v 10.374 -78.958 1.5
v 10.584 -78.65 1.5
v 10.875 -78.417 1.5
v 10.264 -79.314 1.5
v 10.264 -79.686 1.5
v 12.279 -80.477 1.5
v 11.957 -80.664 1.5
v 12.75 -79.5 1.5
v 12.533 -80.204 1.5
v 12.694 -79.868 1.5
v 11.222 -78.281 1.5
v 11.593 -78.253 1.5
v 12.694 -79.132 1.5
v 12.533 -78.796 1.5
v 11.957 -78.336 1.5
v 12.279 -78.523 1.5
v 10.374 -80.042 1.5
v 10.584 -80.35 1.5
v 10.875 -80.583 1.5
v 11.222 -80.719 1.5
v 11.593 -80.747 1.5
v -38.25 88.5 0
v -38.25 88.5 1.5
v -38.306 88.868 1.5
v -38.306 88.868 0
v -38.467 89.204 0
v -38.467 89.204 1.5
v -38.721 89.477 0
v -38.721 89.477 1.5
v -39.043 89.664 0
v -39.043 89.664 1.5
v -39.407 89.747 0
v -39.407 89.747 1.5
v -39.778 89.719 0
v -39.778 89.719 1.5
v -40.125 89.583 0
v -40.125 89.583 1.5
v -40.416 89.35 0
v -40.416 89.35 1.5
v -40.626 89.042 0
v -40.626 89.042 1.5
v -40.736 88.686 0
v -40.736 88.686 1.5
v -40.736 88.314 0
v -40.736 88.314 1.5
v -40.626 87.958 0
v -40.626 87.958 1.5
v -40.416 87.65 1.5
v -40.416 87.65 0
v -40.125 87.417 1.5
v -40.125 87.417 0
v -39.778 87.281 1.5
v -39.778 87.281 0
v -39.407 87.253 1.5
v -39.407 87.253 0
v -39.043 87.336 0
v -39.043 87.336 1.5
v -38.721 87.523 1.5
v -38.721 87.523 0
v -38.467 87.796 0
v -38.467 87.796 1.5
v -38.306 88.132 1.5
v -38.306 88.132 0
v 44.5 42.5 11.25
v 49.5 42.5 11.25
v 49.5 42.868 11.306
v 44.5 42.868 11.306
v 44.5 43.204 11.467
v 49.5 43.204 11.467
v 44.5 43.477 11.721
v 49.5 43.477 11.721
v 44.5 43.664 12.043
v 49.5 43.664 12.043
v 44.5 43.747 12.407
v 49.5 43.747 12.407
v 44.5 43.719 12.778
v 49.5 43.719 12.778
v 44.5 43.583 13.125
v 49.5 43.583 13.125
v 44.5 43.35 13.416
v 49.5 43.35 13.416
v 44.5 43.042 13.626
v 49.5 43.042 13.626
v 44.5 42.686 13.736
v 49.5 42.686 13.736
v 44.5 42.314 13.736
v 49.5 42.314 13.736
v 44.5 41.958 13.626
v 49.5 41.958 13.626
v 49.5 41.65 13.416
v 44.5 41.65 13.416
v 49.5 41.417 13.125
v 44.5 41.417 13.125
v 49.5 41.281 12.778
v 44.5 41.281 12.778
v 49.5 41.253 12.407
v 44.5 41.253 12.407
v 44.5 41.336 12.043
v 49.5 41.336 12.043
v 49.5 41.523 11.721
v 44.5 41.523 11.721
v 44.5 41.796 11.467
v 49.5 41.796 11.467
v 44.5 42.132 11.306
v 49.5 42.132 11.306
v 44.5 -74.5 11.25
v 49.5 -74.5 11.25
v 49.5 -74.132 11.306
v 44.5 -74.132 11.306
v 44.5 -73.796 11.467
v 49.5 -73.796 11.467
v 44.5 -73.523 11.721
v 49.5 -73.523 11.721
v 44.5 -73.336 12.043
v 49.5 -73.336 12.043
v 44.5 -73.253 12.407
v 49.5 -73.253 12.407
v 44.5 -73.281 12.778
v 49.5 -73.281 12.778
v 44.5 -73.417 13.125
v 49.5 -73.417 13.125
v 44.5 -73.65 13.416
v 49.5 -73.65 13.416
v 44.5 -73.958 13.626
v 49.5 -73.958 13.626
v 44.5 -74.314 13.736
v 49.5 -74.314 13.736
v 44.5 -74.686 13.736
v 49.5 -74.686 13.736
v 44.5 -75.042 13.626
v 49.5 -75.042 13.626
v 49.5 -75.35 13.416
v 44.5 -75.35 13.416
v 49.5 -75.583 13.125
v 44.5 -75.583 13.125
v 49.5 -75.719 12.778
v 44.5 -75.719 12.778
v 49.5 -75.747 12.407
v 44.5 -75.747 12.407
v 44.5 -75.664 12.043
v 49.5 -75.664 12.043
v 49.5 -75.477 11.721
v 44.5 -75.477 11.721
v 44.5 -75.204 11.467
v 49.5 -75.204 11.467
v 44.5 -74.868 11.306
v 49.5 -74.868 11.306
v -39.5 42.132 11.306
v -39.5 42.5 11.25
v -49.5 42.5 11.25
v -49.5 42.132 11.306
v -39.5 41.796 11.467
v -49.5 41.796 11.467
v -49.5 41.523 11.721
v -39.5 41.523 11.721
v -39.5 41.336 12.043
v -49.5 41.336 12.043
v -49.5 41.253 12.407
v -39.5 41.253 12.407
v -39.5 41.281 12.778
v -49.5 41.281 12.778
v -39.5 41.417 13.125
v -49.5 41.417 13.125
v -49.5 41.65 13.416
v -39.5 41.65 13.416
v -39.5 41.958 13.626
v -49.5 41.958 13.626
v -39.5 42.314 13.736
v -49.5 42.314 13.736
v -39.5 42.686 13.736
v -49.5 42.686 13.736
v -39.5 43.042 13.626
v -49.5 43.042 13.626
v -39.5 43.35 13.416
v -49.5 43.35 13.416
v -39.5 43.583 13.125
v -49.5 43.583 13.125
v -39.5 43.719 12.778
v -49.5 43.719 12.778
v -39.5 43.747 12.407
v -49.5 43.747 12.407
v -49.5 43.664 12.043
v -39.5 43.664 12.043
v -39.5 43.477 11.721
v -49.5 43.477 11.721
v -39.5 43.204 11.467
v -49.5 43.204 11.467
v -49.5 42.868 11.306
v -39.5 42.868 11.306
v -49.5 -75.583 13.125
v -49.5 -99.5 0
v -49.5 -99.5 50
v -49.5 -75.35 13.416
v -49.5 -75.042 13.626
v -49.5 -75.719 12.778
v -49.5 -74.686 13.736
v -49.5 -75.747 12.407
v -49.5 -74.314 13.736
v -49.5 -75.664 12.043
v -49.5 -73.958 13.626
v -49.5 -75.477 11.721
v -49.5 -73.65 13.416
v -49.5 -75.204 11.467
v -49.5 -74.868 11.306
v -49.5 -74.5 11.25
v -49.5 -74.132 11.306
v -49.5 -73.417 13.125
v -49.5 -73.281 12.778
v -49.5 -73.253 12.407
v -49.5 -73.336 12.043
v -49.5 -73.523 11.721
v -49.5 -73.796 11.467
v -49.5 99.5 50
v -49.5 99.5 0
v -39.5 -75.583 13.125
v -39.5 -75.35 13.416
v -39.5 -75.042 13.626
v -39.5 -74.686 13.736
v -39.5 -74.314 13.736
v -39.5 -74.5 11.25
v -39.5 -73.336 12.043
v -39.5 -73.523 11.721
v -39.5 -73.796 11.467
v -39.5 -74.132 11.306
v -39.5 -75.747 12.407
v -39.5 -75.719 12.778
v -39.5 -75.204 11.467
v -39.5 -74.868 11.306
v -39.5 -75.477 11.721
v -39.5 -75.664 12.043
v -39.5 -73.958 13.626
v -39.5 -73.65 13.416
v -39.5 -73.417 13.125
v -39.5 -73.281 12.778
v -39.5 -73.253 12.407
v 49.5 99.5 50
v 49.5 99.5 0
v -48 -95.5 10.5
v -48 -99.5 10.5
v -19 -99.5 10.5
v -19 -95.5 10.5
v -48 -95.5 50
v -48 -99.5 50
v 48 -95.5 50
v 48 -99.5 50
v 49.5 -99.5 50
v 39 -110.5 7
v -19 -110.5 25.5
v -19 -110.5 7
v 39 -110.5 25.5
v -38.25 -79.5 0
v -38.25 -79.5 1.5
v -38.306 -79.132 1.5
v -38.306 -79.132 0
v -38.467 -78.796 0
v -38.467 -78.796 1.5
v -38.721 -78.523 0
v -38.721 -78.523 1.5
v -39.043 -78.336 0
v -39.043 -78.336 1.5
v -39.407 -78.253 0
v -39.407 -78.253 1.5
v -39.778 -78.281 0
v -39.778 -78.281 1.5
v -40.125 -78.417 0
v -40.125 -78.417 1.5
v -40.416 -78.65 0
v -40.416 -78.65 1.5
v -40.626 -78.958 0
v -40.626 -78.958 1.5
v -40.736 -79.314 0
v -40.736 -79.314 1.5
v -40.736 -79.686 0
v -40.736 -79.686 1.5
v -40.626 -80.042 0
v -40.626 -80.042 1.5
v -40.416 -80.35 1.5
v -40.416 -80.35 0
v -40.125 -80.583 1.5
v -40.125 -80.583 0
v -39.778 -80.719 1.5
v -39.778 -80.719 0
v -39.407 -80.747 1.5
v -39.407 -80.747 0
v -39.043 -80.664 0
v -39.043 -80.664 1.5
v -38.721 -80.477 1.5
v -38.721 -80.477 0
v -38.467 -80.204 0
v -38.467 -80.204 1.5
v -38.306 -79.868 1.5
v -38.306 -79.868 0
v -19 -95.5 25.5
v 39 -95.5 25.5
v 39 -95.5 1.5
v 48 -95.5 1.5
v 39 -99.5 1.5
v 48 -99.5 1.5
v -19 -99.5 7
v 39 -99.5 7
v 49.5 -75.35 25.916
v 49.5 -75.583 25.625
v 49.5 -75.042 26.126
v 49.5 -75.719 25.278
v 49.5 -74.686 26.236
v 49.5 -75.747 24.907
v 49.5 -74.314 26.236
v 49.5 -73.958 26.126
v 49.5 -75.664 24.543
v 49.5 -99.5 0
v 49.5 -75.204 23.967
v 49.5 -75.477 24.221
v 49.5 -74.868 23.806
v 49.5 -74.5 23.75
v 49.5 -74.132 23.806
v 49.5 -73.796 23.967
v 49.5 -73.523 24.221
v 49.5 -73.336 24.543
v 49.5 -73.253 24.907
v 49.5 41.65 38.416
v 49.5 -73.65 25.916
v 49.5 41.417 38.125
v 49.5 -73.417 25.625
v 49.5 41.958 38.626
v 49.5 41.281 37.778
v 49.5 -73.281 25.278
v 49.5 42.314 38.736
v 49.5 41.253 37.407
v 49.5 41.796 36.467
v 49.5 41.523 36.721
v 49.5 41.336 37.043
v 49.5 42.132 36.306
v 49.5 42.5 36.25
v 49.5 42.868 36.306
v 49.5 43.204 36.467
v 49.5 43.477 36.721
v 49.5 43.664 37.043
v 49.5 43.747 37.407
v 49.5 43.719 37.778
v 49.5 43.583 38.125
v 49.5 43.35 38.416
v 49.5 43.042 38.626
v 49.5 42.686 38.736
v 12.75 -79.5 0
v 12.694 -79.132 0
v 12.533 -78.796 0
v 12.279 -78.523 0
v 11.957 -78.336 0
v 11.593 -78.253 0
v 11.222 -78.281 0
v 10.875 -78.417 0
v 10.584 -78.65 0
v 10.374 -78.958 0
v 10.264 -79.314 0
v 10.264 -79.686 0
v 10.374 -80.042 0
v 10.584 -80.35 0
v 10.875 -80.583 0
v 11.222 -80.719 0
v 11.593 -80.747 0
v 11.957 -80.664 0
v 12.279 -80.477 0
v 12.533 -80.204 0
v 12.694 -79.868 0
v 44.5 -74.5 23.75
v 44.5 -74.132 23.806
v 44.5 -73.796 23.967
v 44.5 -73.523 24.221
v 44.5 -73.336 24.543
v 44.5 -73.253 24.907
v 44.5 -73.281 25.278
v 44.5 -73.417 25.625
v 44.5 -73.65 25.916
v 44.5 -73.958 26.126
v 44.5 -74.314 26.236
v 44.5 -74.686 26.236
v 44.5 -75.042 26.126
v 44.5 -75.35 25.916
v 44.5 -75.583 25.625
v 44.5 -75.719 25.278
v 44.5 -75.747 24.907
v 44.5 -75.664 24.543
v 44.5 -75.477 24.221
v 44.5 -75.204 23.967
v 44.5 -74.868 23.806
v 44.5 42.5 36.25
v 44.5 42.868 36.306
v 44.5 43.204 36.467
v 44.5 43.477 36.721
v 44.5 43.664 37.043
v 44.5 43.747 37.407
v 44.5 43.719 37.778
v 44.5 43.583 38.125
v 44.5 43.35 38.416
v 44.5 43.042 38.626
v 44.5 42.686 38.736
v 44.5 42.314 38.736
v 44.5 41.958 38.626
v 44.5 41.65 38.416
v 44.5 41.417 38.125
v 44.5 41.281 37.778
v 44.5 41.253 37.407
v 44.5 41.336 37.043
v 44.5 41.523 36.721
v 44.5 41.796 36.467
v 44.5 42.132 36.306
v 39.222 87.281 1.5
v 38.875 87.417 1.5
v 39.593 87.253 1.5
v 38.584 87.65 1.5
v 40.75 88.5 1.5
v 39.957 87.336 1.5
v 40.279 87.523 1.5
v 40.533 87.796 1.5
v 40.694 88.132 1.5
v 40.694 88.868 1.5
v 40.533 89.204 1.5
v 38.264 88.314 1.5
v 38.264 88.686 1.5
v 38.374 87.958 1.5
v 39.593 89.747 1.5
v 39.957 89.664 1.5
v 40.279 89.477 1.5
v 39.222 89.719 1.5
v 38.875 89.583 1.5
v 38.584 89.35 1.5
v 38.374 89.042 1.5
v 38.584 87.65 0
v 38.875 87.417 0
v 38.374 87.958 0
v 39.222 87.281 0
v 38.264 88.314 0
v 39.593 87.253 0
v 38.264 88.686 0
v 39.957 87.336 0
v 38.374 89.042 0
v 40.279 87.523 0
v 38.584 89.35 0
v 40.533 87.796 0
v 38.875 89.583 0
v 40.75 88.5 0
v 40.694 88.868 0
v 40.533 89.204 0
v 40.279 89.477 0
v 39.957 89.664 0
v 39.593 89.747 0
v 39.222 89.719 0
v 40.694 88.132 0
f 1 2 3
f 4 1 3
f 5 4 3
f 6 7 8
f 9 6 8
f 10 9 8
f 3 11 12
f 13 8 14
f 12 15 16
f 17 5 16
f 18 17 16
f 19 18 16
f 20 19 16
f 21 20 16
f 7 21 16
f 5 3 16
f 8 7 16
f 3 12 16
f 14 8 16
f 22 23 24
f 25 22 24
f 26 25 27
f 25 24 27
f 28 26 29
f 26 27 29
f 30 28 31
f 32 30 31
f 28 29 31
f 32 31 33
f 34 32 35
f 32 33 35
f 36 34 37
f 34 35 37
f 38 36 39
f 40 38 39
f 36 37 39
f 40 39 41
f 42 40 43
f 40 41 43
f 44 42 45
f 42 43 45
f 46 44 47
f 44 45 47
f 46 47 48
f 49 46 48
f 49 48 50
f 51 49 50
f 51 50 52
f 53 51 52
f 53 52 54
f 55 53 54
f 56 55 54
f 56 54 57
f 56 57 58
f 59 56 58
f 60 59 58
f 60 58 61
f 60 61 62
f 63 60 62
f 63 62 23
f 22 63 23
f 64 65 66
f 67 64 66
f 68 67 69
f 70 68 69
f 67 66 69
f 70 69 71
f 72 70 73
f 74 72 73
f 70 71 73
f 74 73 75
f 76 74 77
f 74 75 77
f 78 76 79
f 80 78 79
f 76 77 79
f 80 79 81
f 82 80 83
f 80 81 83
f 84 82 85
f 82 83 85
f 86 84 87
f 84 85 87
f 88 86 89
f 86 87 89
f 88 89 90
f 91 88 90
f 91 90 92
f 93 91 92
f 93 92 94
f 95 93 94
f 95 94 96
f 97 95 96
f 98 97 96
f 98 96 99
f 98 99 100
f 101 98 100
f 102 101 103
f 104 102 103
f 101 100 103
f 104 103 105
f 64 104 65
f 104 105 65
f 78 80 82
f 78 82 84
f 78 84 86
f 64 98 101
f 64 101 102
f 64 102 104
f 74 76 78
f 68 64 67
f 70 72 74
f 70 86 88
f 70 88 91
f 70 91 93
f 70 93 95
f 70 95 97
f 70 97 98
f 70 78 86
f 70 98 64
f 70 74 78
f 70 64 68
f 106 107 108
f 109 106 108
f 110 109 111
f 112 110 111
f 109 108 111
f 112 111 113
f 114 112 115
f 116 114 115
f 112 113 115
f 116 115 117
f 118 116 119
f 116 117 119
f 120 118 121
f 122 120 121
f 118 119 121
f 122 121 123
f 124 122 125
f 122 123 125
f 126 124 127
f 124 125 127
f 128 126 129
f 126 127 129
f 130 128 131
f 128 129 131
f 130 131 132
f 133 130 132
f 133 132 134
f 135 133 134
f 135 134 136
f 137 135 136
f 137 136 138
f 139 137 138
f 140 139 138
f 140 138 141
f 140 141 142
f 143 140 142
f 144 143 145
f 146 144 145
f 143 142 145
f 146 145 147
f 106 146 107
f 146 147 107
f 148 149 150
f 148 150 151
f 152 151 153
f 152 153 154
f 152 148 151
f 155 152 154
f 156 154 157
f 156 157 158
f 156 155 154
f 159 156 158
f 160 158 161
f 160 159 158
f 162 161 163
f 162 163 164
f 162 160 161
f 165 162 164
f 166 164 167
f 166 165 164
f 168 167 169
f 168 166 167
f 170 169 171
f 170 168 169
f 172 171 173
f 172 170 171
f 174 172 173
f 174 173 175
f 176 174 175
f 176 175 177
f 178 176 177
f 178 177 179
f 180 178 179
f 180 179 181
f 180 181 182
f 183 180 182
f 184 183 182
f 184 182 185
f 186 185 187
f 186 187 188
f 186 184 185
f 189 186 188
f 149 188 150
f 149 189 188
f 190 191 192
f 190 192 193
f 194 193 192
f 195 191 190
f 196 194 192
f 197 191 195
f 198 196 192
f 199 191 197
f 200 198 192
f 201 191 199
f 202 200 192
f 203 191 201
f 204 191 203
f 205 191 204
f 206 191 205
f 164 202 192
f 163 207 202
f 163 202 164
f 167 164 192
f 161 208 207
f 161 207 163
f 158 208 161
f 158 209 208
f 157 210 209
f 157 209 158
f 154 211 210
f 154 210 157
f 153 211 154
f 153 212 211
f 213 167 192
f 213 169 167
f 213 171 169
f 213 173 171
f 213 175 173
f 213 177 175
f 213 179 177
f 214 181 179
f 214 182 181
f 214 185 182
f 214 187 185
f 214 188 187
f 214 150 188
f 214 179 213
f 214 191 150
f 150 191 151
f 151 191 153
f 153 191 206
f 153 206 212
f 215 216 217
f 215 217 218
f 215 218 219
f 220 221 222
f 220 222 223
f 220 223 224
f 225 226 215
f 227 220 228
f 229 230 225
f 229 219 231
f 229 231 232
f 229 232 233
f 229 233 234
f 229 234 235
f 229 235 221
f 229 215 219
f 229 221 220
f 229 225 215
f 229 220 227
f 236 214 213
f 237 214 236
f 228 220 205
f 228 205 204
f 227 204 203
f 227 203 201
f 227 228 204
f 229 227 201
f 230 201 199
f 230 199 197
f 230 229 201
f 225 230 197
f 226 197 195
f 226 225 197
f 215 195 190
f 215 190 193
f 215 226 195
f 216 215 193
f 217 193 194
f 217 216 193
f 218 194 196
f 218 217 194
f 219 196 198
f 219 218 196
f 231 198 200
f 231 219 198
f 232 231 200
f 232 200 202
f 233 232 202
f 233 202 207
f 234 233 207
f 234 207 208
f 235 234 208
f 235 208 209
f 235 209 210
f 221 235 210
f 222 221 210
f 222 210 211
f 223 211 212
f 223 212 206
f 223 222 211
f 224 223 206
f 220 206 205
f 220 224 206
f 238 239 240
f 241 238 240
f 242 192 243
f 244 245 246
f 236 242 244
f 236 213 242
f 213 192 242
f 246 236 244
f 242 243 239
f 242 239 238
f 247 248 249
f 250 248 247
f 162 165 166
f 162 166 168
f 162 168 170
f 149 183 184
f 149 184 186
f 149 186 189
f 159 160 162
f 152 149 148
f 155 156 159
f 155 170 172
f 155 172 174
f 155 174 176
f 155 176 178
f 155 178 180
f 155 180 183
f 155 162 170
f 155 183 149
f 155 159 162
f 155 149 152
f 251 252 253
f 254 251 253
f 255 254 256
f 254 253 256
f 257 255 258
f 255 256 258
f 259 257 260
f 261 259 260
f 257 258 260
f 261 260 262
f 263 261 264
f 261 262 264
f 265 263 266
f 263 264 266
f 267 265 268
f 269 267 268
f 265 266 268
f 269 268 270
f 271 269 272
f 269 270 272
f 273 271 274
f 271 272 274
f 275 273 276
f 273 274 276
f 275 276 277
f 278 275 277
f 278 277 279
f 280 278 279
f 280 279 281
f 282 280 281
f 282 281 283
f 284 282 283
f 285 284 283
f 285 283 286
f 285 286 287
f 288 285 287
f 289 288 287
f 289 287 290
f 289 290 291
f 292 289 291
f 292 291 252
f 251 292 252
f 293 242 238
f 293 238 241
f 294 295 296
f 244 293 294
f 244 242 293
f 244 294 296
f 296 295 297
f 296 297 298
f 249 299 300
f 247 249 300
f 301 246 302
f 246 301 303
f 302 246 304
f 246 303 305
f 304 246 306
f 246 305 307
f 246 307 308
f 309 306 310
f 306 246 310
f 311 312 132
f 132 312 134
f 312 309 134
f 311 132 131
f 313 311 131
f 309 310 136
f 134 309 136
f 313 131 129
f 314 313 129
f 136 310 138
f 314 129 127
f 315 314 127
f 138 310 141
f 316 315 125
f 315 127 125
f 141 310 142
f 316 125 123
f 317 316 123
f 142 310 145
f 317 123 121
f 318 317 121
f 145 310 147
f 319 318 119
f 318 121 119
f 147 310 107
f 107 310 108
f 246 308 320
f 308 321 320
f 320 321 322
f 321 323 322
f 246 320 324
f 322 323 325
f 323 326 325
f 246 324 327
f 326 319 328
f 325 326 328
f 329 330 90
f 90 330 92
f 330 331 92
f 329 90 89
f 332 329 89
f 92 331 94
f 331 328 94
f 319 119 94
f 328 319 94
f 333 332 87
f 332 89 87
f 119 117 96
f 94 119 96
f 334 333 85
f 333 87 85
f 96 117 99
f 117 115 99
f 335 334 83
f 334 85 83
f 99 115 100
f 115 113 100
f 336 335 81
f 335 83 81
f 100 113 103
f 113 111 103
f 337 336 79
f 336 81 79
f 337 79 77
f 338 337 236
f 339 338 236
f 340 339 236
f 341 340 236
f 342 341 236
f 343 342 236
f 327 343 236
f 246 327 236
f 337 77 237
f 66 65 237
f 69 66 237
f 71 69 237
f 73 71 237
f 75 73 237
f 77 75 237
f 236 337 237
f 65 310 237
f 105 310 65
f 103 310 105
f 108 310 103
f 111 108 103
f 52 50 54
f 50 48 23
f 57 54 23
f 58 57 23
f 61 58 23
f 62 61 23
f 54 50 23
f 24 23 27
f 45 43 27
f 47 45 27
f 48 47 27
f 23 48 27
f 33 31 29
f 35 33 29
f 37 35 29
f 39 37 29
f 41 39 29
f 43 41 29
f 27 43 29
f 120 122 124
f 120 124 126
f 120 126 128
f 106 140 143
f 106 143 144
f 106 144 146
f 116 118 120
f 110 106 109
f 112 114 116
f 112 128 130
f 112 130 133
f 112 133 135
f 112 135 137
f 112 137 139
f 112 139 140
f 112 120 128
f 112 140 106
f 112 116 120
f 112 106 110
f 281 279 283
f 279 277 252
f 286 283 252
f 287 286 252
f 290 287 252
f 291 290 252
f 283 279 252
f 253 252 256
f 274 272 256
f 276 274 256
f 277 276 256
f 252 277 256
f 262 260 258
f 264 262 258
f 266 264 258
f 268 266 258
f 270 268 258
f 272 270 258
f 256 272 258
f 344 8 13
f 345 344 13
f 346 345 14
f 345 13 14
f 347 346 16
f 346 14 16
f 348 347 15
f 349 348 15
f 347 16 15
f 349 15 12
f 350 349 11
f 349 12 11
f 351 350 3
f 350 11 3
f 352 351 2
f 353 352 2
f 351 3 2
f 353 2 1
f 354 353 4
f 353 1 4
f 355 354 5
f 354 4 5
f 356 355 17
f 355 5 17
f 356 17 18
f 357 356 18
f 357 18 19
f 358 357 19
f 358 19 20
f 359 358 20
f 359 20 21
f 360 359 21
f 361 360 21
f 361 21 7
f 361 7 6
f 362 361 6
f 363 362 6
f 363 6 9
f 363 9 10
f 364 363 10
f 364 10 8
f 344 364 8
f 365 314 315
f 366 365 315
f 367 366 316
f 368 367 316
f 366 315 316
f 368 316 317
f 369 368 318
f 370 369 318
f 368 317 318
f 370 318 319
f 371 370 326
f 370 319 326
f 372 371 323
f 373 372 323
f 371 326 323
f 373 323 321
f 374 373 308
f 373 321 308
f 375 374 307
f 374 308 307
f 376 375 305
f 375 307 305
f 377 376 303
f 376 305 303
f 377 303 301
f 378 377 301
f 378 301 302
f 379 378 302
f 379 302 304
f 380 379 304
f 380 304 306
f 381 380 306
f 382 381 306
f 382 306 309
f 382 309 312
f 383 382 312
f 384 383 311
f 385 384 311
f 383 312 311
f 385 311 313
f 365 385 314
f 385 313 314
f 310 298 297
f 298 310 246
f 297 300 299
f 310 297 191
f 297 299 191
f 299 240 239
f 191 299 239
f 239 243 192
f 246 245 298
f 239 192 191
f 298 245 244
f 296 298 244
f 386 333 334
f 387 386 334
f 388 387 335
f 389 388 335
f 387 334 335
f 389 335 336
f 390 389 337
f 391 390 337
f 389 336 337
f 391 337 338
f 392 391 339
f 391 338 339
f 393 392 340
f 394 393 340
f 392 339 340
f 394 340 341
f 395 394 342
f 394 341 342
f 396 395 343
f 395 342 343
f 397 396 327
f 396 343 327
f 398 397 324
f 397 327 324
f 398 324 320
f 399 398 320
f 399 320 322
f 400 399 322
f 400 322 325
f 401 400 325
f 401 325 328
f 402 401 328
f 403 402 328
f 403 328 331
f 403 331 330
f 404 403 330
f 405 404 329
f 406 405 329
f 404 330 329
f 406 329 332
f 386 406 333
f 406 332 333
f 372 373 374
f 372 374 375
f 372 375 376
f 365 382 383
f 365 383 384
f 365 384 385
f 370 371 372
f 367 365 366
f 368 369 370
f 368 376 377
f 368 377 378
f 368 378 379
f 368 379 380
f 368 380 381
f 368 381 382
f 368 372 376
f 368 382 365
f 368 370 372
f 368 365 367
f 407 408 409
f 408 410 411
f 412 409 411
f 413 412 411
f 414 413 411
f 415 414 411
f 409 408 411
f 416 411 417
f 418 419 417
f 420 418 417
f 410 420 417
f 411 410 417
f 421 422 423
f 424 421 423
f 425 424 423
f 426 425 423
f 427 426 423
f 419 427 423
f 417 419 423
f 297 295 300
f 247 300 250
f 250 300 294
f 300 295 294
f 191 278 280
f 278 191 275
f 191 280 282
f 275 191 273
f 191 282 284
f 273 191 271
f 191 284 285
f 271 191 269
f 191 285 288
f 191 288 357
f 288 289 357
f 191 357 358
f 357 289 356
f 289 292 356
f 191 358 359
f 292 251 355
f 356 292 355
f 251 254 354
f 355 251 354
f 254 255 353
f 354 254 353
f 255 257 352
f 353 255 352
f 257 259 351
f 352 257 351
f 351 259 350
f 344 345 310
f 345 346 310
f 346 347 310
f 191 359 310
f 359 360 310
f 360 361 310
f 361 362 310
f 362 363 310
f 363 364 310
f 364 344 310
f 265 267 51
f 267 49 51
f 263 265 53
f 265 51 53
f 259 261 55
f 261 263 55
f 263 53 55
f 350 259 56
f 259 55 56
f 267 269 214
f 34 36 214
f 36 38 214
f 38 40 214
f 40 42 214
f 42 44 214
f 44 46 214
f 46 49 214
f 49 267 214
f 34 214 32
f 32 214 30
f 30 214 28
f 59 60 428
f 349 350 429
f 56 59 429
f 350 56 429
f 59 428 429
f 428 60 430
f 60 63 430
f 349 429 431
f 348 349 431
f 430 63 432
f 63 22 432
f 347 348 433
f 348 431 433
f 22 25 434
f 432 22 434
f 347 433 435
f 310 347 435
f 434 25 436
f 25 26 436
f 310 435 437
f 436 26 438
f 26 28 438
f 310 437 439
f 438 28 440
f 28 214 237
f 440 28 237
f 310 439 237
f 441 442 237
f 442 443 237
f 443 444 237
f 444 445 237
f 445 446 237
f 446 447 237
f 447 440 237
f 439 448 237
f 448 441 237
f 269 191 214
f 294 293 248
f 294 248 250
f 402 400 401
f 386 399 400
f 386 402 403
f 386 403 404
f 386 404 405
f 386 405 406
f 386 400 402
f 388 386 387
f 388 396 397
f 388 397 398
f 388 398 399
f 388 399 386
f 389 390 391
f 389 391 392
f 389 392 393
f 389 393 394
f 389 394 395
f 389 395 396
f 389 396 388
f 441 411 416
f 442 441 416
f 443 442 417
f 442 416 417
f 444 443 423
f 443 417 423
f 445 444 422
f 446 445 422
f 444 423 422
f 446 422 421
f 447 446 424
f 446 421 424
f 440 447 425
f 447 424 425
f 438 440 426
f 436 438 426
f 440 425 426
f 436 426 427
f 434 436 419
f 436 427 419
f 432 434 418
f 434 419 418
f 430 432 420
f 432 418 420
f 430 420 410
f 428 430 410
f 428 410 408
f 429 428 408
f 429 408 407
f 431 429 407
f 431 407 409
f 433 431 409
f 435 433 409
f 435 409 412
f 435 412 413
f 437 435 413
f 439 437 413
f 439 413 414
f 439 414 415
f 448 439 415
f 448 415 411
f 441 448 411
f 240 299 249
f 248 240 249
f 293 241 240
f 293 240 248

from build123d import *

# Parameters (mm, degrees)
SKETCH1_W           = 99
SKETCH1_H           = 199
BOSS_EXTRUDE1_DEPTH = 50
SKETCH2_W           = 96
SKETCH2_H           = 4
CUT_EXTRUDE1_DEPTH  = 48.5
BOSS_EXTRUDE2_REACH = 213.072
SKETCH7_W           = 58
SKETCH7_H           = 18.5
BOSS_EXTRUDE3_DEPTH = 11
SKETCH9_R           = 1.25
CUT_EXTRUDE6_DEPTH  = 131.432932958
SKETCH10_R          = 1.25
CUT_EXTRUDE7_DEPTH  = 5
CUT_EXTRUDE8_START  = -10
SKETCH11_R          = 1.25
CUT_EXTRUDE8_DEPTH  = 10


with BuildPart() as part:
    # Sketch1 → Boss-Extrude1 (new body)
    with BuildSketch(Plane.XY):
        Rectangle(SKETCH1_W, SKETCH1_H)
    extrude(amount=BOSS_EXTRUDE1_DEPTH)

    # Sketch2 → Cut-Extrude1 (cut)
    with BuildSketch(Plane.XY.offset(50)):
        with Locations((0, -97.5)):
            Rectangle(SKETCH2_W, SKETCH2_H)
    extrude(amount=-CUT_EXTRUDE1_DEPTH, mode=Mode.SUBTRACT)

    # Sketch3 → Boss-Extrude2 (add, up to next)
    with BuildSketch(Plane.XZ.offset(99.5), mode=Mode.PRIVATE) as boss_extrude2_sk1:
        Polygon((39, 1.5), (-43.455469088, 1.5), (-48, 1.5), (-48, 10.5), (-19, 10.5), (-19, 25.5), (39, 25.5), align=None)
    boss_extrude2_tool1 = extrude(boss_extrude2_sk1.sketch, amount=-BOSS_EXTRUDE2_REACH, mode=Mode.PRIVATE) - part.part
    add(boss_extrude2_tool1.solids().sort_by_distance((3.131579, -99.5, 12.315789))[0])

    # Sketch7 → Boss-Extrude3 (add)
    with BuildSketch(Plane.XZ.offset(99.5)):
        with Locations((10, 16.25)):
            Rectangle(SKETCH7_W, SKETCH7_H)
    extrude(amount=BOSS_EXTRUDE3_DEPTH)

    # Sketch9 → Cut-Extrude6 (cut, through all)
    with BuildSketch(Plane.XY.offset(1.5)):
        with Locations((11.5, -79.5)):
            Circle(SKETCH9_R)
        with Locations((-39.5, -79.5)):
            Circle(SKETCH9_R)
        with Locations((-39.5, 88.5)):
            Circle(SKETCH9_R)
        with Locations((39.5, 88.5)):
            Circle(SKETCH9_R)
    extrude(amount=-CUT_EXTRUDE6_DEPTH, mode=Mode.SUBTRACT)

    # Sketch10 → Cut-Extrude7 (cut)
    with BuildSketch(Plane(origin=(49.5, 0, 0), x_dir=(0, 0, -1), z_dir=(1, 0, 0))):
        with Locations((-37.5, 42.5)):
            Circle(SKETCH10_R)
        with Locations((-12.5, 42.5)):
            Circle(SKETCH10_R)
        with Locations((-25, -74.5)):
            Circle(SKETCH10_R)
        with Locations((-12.5, -74.5)):
            Circle(SKETCH10_R)
    extrude(amount=-CUT_EXTRUDE7_DEPTH, mode=Mode.SUBTRACT)

    # Sketch11 → Cut-Extrude8 (cut)
    with BuildSketch(Plane.ZY.offset(49.5).offset(CUT_EXTRUDE8_START)):
        with Locations(Location((12.5, -74.5, 0), (0, 0, 180))):
            Circle(SKETCH11_R)
        with Locations(Location((12.5, 42.5, 0), (0, 0, 180))):
            Circle(SKETCH11_R)
    extrude(amount=CUT_EXTRUDE8_DEPTH, mode=Mode.SUBTRACT)


solid = part.part
